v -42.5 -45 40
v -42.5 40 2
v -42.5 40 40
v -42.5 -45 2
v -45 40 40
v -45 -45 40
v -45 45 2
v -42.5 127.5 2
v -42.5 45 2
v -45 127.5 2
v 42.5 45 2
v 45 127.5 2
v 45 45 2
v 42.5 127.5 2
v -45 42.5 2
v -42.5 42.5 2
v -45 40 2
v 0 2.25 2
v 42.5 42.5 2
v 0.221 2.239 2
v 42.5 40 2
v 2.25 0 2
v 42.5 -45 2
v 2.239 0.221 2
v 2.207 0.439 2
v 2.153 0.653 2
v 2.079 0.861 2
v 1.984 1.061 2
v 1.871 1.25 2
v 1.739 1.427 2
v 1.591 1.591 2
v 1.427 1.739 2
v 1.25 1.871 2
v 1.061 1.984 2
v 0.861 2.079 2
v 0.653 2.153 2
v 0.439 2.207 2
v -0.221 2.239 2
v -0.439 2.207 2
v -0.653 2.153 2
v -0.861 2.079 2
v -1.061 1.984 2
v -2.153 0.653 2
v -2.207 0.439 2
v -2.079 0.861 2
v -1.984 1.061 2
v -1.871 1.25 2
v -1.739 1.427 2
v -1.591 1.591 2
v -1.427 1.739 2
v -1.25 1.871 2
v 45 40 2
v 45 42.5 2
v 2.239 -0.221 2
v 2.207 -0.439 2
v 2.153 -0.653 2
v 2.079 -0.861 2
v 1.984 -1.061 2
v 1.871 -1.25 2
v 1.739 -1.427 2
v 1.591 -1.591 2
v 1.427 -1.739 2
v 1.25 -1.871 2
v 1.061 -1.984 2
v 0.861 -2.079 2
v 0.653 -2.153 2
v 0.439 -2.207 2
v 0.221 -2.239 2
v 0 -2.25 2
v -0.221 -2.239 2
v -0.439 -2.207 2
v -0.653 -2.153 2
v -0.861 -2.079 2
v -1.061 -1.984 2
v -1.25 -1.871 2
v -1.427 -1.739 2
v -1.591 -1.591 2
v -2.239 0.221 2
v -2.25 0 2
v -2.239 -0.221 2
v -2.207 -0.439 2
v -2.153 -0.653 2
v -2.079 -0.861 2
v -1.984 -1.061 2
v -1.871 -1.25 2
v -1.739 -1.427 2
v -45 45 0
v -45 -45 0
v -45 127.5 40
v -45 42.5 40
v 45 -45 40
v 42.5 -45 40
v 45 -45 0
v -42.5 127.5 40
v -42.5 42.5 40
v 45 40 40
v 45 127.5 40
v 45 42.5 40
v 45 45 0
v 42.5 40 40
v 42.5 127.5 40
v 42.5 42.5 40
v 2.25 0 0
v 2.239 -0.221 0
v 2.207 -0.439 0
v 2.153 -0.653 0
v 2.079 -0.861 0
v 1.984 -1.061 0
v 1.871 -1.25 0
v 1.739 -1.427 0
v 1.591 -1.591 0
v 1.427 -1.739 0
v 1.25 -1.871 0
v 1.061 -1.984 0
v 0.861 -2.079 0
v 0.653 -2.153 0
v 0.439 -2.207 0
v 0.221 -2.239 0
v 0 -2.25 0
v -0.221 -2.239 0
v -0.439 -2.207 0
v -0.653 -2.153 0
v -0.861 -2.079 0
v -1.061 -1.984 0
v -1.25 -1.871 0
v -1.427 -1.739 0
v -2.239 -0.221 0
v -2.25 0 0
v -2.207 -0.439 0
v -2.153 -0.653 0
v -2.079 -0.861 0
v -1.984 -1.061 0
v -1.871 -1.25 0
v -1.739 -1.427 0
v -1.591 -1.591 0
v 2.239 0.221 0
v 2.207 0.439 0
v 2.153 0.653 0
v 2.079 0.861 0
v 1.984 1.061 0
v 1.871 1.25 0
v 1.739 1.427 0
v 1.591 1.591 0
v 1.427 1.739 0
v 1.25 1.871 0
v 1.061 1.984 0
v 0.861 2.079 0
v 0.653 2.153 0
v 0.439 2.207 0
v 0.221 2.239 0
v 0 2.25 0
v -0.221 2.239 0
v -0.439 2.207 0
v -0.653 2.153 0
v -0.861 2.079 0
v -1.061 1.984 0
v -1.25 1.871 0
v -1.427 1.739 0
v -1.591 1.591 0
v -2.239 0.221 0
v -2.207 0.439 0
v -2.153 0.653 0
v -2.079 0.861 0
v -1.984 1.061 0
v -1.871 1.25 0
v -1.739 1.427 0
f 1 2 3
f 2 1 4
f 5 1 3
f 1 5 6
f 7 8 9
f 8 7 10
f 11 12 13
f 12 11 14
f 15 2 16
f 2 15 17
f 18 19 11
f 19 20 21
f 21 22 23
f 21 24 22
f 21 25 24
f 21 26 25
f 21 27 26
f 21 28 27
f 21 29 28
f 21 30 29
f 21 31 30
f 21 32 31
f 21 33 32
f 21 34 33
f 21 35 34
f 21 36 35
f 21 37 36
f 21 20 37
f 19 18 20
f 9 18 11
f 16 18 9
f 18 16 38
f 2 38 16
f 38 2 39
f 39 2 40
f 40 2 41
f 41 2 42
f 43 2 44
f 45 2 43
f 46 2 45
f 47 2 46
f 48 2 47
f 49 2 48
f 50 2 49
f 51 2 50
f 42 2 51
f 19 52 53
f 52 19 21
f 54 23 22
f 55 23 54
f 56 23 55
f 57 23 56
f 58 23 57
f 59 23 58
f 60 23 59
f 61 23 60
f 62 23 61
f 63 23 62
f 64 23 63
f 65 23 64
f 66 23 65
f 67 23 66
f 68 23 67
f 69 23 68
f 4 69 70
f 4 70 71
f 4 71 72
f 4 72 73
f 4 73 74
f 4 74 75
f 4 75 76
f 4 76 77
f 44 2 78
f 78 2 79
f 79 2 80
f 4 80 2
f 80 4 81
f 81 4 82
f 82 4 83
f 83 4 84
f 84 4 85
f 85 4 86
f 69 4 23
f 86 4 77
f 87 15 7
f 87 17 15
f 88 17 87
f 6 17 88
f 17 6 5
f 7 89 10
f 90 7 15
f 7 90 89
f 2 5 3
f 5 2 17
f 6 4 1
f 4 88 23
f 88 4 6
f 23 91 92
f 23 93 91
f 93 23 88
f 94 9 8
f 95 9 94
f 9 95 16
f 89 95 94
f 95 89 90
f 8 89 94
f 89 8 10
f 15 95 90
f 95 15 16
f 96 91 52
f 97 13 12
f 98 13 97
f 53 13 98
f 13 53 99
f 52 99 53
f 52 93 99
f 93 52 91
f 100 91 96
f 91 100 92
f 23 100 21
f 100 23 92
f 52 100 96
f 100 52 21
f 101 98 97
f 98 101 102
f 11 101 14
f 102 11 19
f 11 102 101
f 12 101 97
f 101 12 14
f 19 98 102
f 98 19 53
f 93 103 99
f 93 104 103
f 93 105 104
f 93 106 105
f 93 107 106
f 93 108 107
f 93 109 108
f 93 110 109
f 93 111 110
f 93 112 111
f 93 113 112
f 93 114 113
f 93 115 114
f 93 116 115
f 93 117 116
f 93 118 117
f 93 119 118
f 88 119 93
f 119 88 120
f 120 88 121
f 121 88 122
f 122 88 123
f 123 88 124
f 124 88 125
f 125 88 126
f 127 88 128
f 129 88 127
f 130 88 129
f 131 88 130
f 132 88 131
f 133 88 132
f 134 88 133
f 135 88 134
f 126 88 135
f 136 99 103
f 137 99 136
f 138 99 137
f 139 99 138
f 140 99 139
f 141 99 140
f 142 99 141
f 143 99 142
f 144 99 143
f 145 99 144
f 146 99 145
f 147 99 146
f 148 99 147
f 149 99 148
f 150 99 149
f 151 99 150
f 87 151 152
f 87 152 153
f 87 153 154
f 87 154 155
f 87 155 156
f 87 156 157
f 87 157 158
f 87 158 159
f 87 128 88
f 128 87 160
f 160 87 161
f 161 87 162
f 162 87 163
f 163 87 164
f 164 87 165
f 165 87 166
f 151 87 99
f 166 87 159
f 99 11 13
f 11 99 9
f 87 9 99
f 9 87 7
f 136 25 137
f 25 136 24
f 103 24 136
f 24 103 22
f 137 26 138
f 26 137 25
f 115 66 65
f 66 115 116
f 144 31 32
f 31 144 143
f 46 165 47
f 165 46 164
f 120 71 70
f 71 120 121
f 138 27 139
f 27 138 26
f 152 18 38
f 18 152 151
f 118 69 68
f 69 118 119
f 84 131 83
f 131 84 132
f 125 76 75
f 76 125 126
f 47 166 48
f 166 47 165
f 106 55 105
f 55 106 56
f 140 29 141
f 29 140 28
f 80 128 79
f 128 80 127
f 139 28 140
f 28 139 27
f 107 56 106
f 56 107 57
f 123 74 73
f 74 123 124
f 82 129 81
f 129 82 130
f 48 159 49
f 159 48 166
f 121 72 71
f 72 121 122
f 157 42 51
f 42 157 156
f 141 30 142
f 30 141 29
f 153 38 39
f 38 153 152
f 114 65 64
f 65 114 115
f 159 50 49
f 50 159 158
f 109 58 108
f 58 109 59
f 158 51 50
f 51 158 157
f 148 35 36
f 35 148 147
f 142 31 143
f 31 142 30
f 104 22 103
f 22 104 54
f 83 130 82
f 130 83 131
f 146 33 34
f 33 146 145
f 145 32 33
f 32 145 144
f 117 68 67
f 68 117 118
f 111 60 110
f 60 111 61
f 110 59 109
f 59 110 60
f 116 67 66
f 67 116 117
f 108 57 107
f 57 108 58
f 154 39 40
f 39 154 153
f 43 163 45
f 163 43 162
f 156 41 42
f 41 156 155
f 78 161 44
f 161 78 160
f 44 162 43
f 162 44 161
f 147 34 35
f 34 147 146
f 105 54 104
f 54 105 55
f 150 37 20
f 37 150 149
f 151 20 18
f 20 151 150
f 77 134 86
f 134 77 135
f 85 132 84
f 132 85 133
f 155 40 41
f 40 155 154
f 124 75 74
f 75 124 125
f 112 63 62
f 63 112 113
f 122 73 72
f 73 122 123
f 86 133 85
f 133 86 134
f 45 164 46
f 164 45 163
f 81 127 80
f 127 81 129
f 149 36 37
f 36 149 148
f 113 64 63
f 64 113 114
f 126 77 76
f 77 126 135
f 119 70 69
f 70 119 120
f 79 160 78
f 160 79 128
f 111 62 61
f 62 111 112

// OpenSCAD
// DIY magnetic stirrer housing - upside-down open box over 80 mm PC fan
// Print orientation: top plate on bed (z = 0), walls rise to open top (z = 40)

$fn = 64;

// ---- Dimensions (mm) ----
plate_t      = 2;     // top plate thickness
wall_t       = 2.5;   // wall thickness
box_h        = 40;    // total height (open top at z = 40)
outer_x      = 90;    // outer size in X
outer_y      = 90;    // outer size in Y
screw_d      = 4.5;   // M4 screw hole diameter
screw_pitch  = 71.5;  // square pattern diagonal (hole centre to hole centre)
notch_w      = 12;    // cable notch width
notch_depth  = 8;     // notch depth from open edge (z = 32 to z = 40)
eps          = 0.5;   // cutter overshoot past faces

// ---- Derived ----
screw_h = box_h;      // holes go through full height
notch_x = 0;          // centred along X axis of wall

difference() {
    // Main body: top plate + four walls
    union() {
        translate([-outer_x/2, -outer_y/2, 0])
            cube([outer_x, outer_y, plate_t]);
        for (sx = [-1, 1], sy = [-1, 1])
            translate([sx > 0 ? outer_x/2 - wall_t : -outer_x/2,
                       sy > 0 ? outer_y/2 - wall_t : -outer_y/2,
                       plate_t])
                cube([wall_t, outer_y - 2*wall_t, box_h - plate_t]);
    }

    // Screw holes through top plate
    for (i = [0:3])
        rotate([0, 0, 90*i])
            translate([0, 0, -eps])
                cylinder(d = screw_d, h = plate_t + 2*eps);

    // Cable notch in one wall (from open edge inward)
    translate([notch_x - notch_w/2, outer_y/2 - notch_w/2, box_h - notch_depth])
        cube([notch_w, notch_w, notch_depth + eps]);
}
